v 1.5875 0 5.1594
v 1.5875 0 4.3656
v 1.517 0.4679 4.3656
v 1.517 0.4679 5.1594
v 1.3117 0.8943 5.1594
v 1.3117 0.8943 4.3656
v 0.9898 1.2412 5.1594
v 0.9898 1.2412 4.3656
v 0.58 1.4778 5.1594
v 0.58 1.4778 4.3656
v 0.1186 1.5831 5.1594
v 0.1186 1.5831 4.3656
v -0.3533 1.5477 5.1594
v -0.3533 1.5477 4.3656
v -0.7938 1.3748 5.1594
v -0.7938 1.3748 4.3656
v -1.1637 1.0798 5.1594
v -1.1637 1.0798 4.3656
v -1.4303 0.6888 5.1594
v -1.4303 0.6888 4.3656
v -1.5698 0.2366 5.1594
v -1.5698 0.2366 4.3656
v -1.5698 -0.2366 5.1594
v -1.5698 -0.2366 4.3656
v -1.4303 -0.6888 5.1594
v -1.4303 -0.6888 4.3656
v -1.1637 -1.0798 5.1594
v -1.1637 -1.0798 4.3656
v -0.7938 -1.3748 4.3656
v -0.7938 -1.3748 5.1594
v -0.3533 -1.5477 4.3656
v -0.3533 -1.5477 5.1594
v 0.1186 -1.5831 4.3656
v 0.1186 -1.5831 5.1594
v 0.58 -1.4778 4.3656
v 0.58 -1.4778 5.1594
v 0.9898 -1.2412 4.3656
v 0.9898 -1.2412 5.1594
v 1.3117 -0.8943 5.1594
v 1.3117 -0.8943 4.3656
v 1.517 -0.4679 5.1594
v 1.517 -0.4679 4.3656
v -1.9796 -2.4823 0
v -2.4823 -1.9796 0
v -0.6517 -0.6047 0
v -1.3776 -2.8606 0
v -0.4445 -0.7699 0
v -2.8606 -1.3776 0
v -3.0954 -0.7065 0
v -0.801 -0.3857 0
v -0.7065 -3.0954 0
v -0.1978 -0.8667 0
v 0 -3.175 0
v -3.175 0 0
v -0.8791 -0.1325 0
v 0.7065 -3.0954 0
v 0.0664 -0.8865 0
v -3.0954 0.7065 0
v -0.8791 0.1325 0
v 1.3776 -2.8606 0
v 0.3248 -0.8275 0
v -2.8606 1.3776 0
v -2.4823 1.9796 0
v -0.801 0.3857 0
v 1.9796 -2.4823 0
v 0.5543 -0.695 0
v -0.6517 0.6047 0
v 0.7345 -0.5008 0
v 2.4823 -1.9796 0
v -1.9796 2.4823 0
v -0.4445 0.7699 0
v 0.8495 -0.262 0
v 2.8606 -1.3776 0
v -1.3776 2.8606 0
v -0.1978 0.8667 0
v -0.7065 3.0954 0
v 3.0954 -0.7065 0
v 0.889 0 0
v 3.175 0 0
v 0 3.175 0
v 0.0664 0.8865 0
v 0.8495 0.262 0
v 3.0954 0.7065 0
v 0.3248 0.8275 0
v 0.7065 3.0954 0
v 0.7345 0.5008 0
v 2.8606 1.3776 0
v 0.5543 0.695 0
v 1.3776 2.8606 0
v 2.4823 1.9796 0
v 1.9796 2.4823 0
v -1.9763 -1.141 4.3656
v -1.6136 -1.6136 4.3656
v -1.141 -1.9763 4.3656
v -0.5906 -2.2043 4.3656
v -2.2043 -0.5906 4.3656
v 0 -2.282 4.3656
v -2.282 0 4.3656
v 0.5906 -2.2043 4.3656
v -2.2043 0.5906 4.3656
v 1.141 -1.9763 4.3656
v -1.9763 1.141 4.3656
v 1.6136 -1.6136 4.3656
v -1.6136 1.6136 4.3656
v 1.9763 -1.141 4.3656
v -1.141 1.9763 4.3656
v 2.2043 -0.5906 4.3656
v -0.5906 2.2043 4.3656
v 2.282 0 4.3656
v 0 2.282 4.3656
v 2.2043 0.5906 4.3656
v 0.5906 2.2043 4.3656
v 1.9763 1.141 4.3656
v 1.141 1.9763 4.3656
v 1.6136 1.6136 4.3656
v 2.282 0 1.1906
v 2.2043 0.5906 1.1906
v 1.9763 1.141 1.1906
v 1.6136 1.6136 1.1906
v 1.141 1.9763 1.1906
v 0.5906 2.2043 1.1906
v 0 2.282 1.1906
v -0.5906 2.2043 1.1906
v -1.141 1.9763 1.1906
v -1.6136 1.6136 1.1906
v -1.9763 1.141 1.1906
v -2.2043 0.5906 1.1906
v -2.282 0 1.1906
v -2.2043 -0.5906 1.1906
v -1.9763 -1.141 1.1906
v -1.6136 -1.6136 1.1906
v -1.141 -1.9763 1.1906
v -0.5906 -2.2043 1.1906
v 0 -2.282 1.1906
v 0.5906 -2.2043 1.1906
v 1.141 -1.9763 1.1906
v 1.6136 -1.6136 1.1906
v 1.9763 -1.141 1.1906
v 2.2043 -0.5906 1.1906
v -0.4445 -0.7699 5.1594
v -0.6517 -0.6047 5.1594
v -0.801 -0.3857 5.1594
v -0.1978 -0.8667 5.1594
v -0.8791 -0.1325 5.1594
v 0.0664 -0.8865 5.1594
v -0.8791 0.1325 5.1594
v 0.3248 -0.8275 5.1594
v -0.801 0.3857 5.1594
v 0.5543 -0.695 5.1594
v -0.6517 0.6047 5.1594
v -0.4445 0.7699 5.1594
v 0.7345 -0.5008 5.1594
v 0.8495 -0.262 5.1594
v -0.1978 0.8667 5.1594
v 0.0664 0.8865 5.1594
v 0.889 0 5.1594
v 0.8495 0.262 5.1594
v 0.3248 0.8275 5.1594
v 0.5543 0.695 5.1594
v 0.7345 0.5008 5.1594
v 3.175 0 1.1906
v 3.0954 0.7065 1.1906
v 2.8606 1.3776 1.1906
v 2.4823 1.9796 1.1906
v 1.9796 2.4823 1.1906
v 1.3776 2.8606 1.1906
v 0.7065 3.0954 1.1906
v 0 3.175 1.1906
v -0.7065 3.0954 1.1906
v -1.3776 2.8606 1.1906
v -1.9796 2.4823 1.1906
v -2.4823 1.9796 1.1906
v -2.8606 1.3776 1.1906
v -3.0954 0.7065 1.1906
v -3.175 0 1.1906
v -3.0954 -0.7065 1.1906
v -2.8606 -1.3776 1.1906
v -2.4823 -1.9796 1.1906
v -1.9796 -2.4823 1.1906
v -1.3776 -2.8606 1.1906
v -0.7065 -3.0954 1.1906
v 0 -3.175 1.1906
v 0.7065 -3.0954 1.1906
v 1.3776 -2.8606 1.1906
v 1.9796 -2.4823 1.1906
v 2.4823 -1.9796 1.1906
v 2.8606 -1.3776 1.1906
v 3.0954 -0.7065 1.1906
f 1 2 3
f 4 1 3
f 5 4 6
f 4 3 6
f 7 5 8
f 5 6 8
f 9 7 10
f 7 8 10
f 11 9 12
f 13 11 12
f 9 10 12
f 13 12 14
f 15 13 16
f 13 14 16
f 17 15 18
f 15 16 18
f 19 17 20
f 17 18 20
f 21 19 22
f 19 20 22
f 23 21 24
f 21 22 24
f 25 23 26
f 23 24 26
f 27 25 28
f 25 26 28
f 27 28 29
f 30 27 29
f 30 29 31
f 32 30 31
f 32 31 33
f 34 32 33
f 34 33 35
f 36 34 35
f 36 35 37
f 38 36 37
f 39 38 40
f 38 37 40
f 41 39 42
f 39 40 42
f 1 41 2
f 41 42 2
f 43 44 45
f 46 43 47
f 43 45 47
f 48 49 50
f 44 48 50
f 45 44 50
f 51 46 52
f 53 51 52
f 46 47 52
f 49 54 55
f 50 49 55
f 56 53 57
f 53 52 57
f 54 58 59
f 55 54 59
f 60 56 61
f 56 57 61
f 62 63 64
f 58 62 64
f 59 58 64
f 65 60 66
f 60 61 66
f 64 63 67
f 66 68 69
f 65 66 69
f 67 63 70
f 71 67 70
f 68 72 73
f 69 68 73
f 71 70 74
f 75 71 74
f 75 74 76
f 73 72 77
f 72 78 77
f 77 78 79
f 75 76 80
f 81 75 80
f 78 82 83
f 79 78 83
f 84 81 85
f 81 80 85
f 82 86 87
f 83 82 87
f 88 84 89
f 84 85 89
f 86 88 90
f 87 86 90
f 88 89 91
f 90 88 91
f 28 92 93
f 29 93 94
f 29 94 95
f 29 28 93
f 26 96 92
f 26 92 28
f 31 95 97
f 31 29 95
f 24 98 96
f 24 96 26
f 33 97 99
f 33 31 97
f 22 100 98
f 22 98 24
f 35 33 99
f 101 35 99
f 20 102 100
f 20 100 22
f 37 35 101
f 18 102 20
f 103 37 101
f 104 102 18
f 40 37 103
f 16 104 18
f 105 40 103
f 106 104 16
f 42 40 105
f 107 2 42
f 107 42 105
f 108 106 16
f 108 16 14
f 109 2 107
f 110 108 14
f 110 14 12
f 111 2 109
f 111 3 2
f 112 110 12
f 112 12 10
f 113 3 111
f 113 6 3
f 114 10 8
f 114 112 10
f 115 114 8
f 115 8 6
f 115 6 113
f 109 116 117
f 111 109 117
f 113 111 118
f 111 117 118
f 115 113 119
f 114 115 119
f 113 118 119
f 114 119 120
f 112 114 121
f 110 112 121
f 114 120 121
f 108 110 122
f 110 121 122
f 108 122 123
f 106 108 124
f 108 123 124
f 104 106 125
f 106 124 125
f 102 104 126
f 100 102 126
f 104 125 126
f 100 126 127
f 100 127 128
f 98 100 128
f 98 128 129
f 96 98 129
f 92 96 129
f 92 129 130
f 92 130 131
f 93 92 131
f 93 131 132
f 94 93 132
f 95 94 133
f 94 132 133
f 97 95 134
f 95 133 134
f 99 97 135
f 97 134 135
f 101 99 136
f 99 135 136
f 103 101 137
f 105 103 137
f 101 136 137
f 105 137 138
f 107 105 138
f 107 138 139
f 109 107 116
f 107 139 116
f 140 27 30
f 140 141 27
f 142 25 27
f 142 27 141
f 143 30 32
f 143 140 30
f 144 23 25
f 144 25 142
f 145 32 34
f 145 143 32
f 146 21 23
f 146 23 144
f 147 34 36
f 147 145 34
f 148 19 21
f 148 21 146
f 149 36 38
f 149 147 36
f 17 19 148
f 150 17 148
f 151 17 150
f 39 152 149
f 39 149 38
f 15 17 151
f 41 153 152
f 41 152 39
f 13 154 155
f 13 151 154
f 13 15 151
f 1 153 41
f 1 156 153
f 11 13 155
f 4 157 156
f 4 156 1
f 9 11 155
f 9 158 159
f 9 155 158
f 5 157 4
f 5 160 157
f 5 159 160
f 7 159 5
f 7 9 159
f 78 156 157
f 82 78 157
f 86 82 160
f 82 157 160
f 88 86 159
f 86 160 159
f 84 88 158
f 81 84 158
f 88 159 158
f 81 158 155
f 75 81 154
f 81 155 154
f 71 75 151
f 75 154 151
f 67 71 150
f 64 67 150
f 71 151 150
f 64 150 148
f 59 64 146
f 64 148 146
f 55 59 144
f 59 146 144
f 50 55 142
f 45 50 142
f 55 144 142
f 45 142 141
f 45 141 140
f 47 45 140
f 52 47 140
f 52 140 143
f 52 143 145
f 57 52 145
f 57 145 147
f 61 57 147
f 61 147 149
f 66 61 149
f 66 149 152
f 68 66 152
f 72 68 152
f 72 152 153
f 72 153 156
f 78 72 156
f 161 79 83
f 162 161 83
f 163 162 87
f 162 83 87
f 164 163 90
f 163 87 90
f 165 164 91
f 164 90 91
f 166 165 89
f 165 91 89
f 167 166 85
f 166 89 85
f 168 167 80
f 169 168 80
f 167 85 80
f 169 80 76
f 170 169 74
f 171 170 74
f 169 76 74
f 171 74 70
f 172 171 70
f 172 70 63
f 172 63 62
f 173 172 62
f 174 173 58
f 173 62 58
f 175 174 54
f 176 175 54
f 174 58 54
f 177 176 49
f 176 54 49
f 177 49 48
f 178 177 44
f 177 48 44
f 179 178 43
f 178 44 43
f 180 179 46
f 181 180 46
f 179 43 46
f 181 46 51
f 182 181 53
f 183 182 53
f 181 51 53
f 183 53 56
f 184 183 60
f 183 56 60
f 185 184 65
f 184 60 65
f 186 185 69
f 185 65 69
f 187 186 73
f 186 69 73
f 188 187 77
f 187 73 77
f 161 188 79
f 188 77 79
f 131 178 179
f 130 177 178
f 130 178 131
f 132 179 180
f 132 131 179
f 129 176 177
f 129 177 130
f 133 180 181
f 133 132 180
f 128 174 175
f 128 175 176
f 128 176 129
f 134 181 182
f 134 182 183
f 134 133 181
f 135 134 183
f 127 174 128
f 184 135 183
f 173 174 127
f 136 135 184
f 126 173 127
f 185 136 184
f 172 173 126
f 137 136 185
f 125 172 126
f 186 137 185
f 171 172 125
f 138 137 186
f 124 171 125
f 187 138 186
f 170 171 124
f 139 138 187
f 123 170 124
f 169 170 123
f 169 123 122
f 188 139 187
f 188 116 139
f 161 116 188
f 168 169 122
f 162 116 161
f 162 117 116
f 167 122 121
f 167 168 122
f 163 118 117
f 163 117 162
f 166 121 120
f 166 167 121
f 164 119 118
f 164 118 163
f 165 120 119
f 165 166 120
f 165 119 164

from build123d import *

# Parameters (mm, degrees)
F0_R     = 3.175
F1_DEPTH = 1.190625
F2_R     = 2.282031
F3_DEPTH = 3.175
F4_R     = 1.5875
F5_DEPTH = 0.79375
F6_R     = 0.889
F7_DEPTH = 5.160375


with BuildPart() as f1:
    # F0 (on Top) → F1 (new body)
    with BuildSketch(Plane.XY):
        Circle(F0_R)
    extrude(amount=F1_DEPTH)

    # F2 (on face) → F3 (join)
    with BuildSketch(Plane.XY.offset(1.190625)):
        Circle(F2_R)
    extrude(amount=F3_DEPTH)

    # F4 (on face) → F5 (join)
    with BuildSketch(Plane.XY.offset(4.365625)):
        Circle(F4_R)
    extrude(amount=F5_DEPTH)

    # F6 (on face) → F7 (cut, through all)
    with BuildSketch(Plane.XY.offset(5.159375)):
        Circle(F6_R)
    extrude(amount=-F7_DEPTH, mode=Mode.SUBTRACT)


solid = f1.part
